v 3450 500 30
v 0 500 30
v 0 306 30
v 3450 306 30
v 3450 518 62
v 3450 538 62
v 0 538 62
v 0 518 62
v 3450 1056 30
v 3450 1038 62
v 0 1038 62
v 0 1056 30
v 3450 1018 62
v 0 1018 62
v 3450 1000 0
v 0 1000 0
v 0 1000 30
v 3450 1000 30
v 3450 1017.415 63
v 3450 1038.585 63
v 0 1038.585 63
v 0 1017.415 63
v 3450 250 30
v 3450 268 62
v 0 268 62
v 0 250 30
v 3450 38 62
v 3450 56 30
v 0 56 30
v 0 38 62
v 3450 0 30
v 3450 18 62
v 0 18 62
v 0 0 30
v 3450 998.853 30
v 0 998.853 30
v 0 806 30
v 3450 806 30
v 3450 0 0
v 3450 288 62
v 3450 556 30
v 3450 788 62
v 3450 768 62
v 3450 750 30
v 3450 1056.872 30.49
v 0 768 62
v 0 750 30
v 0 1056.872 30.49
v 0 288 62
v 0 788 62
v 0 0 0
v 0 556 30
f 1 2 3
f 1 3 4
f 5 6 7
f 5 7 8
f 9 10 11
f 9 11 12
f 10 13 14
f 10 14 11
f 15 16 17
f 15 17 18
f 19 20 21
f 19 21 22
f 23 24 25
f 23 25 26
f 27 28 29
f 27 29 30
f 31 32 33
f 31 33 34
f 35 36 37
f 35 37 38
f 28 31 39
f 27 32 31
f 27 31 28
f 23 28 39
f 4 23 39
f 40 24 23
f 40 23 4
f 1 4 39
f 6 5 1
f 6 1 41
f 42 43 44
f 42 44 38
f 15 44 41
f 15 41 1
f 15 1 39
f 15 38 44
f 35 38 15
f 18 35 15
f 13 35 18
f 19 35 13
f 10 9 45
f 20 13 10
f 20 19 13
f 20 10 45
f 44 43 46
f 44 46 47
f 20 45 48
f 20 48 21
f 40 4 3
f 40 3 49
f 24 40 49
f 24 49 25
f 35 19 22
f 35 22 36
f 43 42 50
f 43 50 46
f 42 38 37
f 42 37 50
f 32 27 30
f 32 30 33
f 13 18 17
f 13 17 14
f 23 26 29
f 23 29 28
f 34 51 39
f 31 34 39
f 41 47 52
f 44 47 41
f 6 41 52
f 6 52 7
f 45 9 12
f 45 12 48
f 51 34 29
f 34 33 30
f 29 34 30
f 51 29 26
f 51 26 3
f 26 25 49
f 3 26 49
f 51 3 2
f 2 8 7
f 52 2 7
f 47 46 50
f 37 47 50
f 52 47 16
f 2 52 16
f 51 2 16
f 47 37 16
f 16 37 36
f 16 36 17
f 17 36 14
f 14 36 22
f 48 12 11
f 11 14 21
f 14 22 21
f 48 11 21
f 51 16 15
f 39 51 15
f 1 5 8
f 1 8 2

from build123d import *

# Parameters (mm, degrees)
F0_W     = 3450
F0_H     = 1000
F1_DEPTH = 30
F3_DEPTH = 3450


with BuildPart() as f1:
    # F0 (on Top) → F1 (new body)
    with BuildSketch(Plane.XY):
        with Locations((1725, 500)):
            Rectangle(F0_W, F0_H)
    extrude(amount=F1_DEPTH)

    # F2 (on face) → F3 (join)
    with BuildSketch(Plane.YZ.offset(3450)):
        Polygon((18, 62), (0, 30), (56, 30), (38, 62), align=None)
        Polygon((268, 62), (250, 30), (306, 30), (288, 62), align=None)
        Polygon((518, 62), (500, 30), (556, 30), (538, 62), align=None)
        Polygon((750, 30), (806, 30), (788, 62), (768, 62), align=None)
        Polygon((998.852653, 30), (1000, 30), (1018, 62), (1038, 62), (1056, 30), (1056.871576, 30.490261), (1038.584847, 63), (1017.415153, 63), align=None)
    extrude(amount=-F3_DEPTH)


solid = f1.part
